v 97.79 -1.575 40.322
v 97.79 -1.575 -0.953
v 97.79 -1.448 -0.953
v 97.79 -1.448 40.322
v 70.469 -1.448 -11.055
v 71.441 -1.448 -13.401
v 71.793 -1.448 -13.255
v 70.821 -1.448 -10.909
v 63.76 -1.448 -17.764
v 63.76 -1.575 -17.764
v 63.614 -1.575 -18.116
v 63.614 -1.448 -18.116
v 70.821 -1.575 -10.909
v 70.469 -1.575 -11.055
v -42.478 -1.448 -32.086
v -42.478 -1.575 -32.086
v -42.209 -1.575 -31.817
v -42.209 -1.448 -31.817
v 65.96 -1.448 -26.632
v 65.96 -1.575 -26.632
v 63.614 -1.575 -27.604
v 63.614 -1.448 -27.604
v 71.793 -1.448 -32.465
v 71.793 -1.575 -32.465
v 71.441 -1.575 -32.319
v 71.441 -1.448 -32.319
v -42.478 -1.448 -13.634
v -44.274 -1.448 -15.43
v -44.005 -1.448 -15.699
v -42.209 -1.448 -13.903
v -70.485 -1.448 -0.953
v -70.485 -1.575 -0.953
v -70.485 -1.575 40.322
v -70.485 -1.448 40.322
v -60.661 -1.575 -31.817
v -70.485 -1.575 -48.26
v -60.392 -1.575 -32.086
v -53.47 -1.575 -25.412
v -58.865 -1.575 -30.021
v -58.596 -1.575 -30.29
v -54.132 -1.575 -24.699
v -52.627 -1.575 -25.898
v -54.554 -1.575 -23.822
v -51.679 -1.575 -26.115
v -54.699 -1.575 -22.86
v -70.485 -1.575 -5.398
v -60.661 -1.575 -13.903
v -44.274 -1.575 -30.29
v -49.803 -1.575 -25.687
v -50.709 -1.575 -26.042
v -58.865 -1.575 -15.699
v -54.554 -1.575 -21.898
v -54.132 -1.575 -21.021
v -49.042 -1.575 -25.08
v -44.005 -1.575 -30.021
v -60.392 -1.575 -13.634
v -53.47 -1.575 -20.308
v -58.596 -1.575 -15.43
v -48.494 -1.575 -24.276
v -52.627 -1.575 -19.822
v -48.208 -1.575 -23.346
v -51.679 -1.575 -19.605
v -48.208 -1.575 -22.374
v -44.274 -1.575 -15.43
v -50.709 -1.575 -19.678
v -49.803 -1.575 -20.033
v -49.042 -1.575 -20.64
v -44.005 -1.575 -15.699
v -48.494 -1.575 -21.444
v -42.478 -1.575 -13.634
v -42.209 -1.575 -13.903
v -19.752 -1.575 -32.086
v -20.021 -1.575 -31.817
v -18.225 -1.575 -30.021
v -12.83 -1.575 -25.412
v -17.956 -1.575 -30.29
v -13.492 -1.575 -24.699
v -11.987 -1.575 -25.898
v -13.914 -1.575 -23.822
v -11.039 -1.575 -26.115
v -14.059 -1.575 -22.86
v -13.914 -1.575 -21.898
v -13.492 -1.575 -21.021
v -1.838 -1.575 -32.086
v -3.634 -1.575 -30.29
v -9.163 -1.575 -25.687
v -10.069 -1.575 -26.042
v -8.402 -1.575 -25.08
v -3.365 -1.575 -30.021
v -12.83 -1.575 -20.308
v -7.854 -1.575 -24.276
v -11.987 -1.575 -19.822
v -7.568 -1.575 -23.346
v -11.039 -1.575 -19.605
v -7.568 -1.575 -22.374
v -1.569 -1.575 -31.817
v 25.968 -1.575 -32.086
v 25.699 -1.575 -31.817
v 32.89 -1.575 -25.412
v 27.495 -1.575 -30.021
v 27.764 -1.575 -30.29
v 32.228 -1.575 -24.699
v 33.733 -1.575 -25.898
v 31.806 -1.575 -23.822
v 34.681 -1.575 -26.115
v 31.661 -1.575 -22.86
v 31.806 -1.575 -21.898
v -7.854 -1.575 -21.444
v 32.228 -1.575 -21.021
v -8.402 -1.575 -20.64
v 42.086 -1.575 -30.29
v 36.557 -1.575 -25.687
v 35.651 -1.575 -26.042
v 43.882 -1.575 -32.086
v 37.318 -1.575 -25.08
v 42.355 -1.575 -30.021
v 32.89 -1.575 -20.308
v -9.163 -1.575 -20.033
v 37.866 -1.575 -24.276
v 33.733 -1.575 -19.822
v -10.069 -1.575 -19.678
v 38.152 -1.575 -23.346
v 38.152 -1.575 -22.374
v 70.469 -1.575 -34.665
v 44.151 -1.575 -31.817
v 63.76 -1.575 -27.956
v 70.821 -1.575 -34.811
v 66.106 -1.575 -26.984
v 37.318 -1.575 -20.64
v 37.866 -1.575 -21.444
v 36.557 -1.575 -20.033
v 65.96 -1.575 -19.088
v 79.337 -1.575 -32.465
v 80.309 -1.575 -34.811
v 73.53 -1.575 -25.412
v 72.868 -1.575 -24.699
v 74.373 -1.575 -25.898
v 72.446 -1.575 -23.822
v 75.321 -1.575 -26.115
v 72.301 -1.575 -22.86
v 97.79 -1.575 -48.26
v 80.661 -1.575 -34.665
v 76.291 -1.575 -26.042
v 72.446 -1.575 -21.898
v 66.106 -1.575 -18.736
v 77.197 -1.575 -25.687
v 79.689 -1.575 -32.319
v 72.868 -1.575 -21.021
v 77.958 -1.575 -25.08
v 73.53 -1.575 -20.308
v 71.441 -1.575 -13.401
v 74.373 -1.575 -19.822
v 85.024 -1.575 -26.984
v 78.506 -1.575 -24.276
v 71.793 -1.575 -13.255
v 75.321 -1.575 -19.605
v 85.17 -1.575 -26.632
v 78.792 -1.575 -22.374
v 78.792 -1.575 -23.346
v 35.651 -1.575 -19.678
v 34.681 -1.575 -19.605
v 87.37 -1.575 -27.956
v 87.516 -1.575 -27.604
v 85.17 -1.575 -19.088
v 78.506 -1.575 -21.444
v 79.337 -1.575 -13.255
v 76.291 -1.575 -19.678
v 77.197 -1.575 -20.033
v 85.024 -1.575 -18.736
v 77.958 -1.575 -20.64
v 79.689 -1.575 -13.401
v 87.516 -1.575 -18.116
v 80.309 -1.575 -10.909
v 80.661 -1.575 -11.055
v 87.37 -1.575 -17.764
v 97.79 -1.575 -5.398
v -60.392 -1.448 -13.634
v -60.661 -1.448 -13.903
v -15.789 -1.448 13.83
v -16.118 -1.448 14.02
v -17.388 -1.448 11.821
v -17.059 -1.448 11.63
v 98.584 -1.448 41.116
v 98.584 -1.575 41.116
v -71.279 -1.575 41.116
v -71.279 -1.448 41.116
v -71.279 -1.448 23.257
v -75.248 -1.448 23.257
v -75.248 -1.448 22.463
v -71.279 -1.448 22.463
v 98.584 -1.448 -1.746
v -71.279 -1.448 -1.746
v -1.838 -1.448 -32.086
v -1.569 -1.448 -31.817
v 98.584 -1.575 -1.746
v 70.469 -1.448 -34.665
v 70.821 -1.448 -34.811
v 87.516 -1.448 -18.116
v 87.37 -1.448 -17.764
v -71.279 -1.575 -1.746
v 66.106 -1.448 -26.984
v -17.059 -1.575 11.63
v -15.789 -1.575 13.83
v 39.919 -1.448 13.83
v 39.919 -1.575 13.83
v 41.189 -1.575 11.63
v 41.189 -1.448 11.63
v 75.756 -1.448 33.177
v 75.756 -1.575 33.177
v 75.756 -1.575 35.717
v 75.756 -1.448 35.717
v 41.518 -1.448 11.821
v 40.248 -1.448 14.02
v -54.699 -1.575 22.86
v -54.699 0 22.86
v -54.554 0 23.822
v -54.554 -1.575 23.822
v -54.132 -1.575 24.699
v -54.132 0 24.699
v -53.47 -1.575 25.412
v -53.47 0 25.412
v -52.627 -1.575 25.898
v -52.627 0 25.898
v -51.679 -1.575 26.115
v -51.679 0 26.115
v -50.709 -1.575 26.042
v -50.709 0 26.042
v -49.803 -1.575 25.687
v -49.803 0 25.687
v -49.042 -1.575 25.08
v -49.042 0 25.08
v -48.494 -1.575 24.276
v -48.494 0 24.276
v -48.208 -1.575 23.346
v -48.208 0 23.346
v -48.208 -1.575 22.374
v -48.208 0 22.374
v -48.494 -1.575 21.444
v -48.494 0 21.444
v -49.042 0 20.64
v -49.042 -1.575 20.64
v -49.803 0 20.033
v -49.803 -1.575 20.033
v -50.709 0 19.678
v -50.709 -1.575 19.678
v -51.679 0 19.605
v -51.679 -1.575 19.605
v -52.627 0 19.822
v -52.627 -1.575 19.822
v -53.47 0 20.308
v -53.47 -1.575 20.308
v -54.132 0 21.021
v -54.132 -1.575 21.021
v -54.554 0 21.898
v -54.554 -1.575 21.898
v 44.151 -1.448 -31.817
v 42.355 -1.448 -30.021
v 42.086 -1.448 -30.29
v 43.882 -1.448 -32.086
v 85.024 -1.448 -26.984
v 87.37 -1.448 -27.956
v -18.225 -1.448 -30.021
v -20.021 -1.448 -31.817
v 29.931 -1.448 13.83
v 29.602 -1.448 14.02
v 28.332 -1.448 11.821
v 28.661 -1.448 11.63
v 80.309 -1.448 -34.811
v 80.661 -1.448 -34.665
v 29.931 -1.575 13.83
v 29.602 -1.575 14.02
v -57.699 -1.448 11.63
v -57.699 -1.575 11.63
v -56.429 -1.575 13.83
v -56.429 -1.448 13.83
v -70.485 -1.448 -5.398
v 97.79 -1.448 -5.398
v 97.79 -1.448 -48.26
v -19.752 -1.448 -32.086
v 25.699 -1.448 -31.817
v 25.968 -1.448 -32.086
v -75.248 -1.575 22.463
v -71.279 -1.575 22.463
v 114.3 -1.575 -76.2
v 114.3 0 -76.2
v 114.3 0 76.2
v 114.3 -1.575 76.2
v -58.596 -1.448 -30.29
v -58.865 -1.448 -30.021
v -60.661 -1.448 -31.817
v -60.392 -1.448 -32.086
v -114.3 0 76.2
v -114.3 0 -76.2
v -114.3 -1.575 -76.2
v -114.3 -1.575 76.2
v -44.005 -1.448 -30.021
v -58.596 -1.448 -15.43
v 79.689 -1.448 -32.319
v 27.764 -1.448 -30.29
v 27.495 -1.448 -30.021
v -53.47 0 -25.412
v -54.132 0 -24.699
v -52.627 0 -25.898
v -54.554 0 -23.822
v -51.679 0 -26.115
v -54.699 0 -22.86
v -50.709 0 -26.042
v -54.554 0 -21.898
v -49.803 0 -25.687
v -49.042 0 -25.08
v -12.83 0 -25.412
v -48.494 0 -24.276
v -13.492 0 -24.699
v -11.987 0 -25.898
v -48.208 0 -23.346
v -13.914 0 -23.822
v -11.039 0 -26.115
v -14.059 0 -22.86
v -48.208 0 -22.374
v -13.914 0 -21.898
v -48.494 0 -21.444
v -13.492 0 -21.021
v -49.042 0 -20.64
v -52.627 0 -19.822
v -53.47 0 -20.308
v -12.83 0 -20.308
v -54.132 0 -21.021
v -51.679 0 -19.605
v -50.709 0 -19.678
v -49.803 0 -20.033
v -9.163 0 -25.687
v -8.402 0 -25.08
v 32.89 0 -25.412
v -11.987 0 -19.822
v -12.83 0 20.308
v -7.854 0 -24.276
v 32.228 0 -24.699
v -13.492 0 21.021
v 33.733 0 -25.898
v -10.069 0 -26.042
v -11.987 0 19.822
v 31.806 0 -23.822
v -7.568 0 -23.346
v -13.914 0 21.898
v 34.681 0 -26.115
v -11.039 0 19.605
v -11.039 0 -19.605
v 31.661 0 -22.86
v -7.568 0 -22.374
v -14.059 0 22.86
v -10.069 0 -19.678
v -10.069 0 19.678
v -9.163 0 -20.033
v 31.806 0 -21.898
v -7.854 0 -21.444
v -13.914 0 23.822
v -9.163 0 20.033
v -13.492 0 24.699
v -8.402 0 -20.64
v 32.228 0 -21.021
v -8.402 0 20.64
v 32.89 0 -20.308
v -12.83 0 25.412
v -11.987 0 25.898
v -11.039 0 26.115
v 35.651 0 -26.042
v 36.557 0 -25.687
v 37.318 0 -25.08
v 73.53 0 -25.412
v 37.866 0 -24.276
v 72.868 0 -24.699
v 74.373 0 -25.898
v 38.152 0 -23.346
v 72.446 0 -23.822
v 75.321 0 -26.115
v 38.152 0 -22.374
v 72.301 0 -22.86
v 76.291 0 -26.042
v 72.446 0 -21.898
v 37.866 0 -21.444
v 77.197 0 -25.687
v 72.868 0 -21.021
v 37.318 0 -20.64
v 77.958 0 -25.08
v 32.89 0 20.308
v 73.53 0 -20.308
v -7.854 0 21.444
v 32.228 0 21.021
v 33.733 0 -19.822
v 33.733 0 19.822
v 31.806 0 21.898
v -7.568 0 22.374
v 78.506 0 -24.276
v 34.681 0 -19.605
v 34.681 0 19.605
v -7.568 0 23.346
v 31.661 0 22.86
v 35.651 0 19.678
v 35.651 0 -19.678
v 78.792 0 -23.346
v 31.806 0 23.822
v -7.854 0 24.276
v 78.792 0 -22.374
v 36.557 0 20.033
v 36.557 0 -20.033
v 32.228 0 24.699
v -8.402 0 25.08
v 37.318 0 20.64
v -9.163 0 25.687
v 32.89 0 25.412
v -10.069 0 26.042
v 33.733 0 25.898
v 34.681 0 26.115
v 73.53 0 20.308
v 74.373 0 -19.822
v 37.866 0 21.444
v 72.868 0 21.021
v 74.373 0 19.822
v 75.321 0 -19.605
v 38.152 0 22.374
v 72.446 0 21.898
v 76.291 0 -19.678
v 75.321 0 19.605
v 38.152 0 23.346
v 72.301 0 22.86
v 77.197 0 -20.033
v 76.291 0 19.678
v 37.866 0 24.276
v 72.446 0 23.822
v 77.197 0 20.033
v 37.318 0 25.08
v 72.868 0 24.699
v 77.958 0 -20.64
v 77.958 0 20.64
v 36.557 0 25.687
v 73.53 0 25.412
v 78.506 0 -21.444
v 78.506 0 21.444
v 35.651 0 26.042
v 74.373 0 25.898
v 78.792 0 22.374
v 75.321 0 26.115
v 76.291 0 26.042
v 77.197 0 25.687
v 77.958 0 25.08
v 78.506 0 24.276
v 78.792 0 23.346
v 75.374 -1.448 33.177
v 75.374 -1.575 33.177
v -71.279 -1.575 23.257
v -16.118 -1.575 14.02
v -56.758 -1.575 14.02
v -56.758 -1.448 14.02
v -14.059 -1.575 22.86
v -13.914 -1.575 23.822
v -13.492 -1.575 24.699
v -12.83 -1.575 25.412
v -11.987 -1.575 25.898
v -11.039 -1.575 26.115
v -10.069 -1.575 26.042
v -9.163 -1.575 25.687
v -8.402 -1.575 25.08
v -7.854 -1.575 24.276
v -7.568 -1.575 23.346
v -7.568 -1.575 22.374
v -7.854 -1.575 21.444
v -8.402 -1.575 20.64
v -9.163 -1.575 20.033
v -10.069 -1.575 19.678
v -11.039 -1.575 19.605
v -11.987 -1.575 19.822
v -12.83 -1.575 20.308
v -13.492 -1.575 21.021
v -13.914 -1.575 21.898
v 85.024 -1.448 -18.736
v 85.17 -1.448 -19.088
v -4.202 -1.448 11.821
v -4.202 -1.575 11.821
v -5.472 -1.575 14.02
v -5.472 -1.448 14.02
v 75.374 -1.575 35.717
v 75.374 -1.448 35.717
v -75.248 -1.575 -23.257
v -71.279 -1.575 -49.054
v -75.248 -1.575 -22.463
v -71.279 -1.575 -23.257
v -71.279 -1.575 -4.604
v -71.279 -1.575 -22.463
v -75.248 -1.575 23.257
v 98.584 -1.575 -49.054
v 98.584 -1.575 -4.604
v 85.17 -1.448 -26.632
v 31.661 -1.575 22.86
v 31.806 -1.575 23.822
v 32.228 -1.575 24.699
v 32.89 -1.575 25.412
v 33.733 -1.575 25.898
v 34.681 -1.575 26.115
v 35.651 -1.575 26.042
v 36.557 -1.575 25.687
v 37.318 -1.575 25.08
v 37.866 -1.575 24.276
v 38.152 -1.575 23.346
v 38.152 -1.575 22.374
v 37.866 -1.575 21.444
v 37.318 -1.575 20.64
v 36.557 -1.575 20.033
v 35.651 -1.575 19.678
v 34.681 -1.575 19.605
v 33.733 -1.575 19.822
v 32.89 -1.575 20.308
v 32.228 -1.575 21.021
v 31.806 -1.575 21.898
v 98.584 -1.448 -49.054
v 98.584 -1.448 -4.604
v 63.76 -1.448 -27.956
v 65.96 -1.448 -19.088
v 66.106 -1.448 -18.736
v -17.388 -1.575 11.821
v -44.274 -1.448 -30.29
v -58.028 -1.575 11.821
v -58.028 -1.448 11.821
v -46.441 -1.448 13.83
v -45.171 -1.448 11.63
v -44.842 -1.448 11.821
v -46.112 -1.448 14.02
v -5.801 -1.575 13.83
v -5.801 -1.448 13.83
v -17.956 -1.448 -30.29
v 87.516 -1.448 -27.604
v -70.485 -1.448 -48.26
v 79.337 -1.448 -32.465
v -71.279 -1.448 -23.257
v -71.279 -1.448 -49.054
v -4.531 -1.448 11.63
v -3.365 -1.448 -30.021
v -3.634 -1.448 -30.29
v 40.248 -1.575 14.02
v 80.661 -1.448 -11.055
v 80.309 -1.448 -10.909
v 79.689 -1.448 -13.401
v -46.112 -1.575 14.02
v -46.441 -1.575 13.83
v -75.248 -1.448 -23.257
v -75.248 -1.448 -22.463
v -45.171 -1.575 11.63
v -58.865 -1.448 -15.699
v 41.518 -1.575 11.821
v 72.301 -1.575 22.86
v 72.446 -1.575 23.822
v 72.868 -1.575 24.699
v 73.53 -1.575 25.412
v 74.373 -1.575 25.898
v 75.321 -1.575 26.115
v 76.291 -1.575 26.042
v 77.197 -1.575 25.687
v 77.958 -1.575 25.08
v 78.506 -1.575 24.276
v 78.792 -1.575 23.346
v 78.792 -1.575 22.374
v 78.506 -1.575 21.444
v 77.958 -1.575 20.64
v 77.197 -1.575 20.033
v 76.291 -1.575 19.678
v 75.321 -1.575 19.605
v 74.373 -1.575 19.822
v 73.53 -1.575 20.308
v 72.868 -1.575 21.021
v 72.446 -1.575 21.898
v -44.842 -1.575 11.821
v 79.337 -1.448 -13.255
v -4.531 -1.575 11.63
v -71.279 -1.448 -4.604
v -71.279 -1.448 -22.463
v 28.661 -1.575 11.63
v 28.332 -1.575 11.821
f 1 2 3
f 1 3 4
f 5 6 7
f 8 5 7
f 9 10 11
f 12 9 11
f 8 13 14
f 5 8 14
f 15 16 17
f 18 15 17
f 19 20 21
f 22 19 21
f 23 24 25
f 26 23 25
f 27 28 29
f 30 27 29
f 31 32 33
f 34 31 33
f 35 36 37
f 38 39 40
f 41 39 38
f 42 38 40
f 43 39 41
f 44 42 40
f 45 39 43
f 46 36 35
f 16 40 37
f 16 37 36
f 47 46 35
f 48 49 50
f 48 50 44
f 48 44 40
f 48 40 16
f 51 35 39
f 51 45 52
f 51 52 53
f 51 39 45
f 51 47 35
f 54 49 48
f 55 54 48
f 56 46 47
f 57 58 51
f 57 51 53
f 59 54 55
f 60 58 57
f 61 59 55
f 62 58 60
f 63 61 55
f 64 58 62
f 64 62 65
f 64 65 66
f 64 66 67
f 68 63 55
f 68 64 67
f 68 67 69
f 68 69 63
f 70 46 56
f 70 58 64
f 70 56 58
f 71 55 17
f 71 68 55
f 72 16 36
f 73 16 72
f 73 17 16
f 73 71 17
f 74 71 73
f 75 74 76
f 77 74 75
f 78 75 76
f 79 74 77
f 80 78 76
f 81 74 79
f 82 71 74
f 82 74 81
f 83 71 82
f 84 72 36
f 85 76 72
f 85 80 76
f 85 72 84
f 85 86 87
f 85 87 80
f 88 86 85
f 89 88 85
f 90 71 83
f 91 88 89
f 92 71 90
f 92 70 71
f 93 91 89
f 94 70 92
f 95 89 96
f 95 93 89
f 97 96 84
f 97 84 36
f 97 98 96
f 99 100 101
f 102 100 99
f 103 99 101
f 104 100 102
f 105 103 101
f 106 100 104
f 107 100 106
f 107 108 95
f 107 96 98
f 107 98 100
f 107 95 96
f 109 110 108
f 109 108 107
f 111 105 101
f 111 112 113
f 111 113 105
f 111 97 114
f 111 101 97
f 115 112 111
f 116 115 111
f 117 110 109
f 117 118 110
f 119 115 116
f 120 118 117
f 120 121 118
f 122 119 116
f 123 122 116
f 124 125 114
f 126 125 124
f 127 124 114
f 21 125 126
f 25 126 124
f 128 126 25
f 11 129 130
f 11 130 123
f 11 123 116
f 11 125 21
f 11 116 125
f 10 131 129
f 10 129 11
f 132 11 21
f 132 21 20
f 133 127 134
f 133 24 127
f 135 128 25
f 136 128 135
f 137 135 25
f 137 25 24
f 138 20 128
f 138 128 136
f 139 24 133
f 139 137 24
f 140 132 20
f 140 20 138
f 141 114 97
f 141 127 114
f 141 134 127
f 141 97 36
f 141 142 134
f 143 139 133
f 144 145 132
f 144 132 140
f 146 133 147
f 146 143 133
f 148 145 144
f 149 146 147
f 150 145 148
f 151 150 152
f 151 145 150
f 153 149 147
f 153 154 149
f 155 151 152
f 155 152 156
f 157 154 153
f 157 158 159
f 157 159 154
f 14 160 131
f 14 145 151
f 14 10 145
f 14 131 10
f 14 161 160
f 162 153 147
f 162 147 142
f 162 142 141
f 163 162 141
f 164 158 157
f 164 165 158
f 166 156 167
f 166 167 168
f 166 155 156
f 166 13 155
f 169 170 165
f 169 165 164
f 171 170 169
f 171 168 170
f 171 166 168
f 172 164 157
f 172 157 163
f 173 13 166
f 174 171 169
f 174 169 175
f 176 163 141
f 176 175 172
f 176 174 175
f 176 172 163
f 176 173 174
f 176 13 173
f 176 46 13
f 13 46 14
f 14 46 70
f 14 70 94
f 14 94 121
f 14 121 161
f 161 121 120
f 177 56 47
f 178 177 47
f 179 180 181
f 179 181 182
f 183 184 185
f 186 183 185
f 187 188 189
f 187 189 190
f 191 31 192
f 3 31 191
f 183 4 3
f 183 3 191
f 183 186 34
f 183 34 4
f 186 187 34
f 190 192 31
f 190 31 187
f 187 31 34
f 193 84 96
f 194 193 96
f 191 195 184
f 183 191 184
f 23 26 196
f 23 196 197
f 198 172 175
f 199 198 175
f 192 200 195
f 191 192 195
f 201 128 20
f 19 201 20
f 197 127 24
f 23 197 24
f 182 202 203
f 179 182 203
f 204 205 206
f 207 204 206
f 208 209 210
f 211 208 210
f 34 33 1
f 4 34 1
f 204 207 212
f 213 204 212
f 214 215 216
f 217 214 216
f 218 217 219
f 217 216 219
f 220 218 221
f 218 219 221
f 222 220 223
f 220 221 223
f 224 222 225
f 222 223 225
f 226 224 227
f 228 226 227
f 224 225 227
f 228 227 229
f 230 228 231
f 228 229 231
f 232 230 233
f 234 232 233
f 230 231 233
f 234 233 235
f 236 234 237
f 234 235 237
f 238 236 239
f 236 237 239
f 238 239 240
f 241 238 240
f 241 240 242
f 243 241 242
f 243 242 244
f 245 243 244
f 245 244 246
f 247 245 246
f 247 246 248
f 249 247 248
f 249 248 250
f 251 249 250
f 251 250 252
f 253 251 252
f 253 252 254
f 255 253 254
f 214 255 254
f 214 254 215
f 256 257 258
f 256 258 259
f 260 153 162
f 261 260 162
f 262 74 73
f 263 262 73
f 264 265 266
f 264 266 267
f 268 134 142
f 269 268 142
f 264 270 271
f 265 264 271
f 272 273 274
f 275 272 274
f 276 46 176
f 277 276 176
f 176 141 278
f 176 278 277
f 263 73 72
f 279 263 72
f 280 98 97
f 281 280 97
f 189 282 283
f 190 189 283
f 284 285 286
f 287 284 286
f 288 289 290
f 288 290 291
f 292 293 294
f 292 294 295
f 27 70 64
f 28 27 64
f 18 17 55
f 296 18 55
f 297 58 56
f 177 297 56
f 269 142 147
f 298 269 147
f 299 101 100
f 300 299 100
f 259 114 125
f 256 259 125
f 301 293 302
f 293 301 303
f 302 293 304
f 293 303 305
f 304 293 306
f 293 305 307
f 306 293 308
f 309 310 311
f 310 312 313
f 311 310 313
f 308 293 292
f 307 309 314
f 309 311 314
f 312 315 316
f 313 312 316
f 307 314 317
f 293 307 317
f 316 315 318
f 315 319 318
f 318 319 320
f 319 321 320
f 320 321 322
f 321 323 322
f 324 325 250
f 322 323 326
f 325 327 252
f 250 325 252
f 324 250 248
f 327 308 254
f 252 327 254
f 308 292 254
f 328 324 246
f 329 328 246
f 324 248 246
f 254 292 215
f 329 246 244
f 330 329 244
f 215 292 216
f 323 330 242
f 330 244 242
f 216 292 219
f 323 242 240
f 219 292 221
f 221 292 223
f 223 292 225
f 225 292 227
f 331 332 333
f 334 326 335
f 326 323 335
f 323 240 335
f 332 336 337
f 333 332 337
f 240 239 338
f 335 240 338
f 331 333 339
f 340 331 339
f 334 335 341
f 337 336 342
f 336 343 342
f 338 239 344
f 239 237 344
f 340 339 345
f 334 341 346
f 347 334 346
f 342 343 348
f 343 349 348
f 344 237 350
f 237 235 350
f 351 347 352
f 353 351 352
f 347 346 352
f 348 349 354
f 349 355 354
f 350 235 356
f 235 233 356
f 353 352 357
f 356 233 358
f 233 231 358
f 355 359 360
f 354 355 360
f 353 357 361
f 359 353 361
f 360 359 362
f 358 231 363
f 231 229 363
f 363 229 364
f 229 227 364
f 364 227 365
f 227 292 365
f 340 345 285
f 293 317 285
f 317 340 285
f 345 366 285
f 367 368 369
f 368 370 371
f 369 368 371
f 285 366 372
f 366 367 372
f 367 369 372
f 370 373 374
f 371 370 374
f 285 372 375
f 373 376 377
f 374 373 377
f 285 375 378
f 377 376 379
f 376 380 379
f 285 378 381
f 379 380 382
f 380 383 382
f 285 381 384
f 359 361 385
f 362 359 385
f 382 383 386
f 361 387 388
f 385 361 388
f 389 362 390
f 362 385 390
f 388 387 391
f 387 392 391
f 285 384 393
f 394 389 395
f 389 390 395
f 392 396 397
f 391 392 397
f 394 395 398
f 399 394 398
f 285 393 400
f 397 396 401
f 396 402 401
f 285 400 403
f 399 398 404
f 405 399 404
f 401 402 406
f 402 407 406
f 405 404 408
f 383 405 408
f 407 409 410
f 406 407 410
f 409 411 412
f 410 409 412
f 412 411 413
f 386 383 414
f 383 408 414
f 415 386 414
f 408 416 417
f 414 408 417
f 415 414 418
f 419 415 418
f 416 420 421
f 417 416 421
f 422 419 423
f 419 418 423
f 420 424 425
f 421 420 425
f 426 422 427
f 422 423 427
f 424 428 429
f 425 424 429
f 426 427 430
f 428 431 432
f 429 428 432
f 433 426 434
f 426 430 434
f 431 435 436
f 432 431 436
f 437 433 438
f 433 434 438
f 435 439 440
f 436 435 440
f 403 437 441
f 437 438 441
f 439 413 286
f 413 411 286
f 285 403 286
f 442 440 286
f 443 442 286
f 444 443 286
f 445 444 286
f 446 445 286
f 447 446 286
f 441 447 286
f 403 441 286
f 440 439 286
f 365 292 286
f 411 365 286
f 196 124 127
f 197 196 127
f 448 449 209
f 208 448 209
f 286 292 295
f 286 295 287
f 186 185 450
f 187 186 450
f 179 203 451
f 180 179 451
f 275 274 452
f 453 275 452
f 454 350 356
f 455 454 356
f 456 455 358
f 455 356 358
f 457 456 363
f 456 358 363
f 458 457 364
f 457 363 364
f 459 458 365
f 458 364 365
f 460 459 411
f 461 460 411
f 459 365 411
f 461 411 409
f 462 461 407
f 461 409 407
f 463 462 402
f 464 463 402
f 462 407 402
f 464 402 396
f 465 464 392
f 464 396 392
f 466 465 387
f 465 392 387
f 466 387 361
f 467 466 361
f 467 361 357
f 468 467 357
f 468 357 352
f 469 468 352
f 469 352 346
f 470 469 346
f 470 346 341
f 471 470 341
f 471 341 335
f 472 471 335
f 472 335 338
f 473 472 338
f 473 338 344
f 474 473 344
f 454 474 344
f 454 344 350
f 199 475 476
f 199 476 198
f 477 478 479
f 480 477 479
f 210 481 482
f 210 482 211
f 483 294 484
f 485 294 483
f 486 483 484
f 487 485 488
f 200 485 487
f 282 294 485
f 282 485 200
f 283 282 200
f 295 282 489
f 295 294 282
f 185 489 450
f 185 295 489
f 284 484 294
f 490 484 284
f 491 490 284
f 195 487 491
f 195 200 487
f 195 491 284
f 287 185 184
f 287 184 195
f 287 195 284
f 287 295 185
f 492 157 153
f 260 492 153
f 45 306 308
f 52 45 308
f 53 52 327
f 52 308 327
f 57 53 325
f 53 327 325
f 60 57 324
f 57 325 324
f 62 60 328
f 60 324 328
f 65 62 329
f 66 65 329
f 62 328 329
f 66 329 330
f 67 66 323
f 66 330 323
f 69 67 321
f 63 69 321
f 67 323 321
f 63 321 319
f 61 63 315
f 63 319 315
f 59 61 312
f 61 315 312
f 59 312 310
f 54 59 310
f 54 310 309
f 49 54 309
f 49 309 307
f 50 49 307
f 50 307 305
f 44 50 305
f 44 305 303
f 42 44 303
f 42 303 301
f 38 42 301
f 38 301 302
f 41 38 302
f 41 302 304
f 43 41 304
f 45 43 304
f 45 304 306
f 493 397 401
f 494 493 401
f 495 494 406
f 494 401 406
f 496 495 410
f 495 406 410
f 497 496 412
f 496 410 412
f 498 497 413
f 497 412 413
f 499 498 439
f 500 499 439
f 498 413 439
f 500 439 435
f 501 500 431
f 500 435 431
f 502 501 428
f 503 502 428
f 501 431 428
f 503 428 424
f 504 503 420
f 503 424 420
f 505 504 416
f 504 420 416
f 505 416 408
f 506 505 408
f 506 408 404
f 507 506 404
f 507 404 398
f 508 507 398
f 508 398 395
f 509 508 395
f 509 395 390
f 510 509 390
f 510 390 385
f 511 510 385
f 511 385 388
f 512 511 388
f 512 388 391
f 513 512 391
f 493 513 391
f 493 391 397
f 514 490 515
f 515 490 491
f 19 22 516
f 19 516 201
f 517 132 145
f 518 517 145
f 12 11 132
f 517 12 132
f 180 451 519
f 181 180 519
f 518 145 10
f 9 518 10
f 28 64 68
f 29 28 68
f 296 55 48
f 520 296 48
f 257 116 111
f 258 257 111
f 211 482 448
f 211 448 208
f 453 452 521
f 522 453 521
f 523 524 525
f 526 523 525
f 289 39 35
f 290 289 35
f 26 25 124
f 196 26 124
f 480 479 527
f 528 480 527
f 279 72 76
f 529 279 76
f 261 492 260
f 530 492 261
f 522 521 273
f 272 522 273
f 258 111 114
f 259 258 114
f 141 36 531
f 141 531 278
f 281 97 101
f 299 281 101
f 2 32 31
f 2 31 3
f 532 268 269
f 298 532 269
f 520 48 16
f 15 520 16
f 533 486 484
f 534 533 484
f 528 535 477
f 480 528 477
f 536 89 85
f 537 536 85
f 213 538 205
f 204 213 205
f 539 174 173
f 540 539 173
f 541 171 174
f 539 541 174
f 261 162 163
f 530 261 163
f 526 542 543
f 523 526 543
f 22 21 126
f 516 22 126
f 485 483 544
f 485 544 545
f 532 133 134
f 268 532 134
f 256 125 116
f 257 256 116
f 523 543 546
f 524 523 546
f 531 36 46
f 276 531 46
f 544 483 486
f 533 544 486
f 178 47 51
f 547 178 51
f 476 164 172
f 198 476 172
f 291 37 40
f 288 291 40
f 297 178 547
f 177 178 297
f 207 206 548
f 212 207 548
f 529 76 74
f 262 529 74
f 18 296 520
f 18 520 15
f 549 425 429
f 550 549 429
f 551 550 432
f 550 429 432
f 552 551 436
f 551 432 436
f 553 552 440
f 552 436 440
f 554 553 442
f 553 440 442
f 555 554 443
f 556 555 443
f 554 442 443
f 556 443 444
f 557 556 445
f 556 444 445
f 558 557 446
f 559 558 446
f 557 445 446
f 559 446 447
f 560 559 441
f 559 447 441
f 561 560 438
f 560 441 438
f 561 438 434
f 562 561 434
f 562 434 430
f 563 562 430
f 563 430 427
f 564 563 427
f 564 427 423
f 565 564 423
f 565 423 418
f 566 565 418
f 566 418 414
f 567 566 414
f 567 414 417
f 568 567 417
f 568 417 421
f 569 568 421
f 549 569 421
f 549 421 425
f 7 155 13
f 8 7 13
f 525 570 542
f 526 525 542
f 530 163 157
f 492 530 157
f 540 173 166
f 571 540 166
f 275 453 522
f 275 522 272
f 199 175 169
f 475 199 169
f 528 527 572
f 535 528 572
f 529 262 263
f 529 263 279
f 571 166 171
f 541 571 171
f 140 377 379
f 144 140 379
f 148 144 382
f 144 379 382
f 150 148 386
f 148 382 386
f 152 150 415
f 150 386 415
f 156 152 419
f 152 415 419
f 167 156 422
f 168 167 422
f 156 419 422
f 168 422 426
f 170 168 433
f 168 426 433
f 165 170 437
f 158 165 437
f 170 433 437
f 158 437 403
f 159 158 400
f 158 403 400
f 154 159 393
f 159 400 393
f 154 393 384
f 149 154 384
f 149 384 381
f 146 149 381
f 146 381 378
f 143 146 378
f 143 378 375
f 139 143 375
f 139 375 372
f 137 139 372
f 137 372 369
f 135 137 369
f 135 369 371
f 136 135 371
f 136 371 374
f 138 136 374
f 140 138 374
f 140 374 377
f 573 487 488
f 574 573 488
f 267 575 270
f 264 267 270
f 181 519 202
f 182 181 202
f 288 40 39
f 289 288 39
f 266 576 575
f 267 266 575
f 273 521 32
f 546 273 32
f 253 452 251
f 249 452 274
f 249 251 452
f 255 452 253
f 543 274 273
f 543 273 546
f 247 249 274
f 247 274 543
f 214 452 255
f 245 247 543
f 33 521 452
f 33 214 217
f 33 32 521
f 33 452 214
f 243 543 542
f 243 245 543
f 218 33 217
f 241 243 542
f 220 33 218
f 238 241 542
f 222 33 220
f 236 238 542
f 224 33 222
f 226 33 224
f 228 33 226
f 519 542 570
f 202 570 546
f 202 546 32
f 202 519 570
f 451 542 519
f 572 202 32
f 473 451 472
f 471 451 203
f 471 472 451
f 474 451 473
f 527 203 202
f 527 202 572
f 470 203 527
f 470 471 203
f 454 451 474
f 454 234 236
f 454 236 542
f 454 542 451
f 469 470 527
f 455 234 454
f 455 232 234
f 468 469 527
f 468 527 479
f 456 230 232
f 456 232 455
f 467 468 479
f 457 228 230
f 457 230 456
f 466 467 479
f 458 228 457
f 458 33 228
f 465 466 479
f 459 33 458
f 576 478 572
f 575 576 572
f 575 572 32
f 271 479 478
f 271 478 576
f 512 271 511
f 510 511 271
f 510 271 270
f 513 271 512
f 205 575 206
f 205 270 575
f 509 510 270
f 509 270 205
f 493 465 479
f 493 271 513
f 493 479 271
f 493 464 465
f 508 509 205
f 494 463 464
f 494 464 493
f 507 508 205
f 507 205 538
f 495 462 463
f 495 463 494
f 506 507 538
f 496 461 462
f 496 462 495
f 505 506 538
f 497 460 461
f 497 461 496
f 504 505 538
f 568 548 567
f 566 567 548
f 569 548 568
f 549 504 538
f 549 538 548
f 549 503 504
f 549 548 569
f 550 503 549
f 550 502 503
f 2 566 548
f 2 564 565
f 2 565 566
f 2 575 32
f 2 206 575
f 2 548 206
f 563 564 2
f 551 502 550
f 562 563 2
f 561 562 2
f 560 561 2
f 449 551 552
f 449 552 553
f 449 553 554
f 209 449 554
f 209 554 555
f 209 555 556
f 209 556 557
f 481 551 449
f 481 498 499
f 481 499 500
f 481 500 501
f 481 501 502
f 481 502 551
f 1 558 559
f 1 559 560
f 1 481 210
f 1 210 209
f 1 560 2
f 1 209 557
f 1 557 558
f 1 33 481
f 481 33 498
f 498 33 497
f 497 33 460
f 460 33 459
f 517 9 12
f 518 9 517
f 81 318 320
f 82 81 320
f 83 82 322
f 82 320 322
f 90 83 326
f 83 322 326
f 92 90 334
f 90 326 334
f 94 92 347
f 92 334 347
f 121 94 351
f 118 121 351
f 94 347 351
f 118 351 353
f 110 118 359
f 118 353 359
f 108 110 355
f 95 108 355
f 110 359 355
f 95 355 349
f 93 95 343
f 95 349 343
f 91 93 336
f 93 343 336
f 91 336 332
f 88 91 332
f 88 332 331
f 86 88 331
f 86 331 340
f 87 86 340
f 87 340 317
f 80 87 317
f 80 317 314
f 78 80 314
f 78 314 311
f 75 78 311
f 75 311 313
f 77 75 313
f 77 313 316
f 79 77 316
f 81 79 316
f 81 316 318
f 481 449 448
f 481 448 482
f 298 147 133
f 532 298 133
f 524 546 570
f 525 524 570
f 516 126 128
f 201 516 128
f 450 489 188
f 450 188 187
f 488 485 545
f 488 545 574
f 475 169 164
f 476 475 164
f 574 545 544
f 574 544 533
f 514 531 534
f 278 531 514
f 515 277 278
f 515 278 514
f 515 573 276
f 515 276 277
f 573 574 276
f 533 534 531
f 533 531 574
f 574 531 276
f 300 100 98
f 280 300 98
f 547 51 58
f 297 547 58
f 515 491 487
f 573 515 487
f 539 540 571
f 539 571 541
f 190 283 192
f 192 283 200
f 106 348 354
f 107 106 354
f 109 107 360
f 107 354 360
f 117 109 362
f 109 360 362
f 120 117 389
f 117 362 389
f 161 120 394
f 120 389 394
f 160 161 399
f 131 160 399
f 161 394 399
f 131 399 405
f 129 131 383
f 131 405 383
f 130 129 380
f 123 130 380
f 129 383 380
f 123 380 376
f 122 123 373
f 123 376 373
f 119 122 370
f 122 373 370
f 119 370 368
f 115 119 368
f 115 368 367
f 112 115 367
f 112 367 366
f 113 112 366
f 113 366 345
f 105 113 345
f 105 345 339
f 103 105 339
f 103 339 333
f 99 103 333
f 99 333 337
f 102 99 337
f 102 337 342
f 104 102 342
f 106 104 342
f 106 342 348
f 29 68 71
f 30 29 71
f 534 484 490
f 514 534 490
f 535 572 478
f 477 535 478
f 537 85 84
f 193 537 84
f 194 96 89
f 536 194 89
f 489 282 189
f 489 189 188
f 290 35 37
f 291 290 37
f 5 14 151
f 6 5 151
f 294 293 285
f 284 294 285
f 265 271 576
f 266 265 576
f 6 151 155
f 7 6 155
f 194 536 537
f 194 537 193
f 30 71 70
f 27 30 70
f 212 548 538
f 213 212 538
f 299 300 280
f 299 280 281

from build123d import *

# Parameters (mm, degrees)
F0_W     = 228.6
F0_H     = 152.4
F1_DEPTH = 1.5748
F3_D     = 6.5278
F5_W     = 0.381
F5_H     = 2.54
F6_DEPTH = 0.127
F7_W     = 168.275
F7_H     = 41.275
F7_W_2   = 3.96875
F7_H_2   = 0.79375
F7_H_3   = 42.8625
F8_DEPTH = 0.127


with BuildPart() as f1:
    # F0 (on Front) → F1 (new body)
    with BuildSketch(Plane.XZ):
        Rectangle(F0_W, F0_H)
    extrude(amount=F1_DEPTH)

    # F3 (through all)
    with Locations(Plane.XZ.offset(1.5748)):
        with Locations((-51.435, 22.86), (-10.795, 22.86), (34.925, 22.86), (75.565, 22.86), (75.565, -22.86), (34.925, -22.86), (-10.795, -22.86), (-51.435, -22.86)):
            Hole(F3_D / 2)

    # F5 (on face) → F6 (cut)
    with BuildSketch(Plane.XZ.offset(1.5748)):
        Polygon((-42.2090303616, -31.8165619547), (-44.0050815859, -30.0205107305), (-44.2744892695, -30.2899184141), (-42.4784380453, -32.0859696384), align=None)
        Polygon((-42.2090303616, -13.9034380453), (-42.4784380453, -13.6340303616), (-44.2744892695, -15.4300815859), (-44.0050815859, -15.6994892695), align=None)
        Polygon((80.3091585435, -10.9087876125), (79.3371426253, -13.2554416251), (79.6891407272, -13.4012440128), (80.6611566454, -11.0545900003), align=None)
        Polygon((85.0237559872, -18.7358592728), (85.1695583749, -19.0878573747), (87.5162123875, -18.1158414565), (87.3704099997, -17.7638433546), align=None)
        Polygon((85.1695583749, -26.6321426253), (85.0237559872, -26.9841407272), (87.3704099997, -27.9561566454), (87.5162123875, -27.6041585435), align=None)
        Polygon((79.6891407272, -32.3187559872), (79.3371426253, -32.4645583749), (80.3091585435, -34.8112123875), (80.6611566454, -34.6654099997), align=None)
        Polygon((71.7928573747, -32.4645583749), (71.4408592728, -32.3187559872), (70.4688433546, -34.6654099997), (70.8208414565, -34.8112123875), align=None)
        Polygon((66.1062440128, -26.9841407272), (65.9604416251, -26.6321426253), (63.6137876125, -27.6041585435), (63.7595900003, -27.9561566454), align=None)
        Polygon((65.9604416251, -19.0878573747), (66.1062440128, -18.7358592728), (63.7595900003, -17.7638433546), (63.6137876125, -18.1158414565), align=None)
        Polygon((71.4408592728, -13.4012440128), (71.7928573747, -13.2554416251), (70.8208414565, -10.9087876125), (70.4688433546, -11.0545900003), align=None)
        Polygon((27.4950815859, -30.0205107305), (25.6990303616, -31.8165619547), (25.9684380453, -32.0859696384), (27.7644892695, -30.2899184141), align=None)
        Polygon((44.1509696384, -31.8165619547), (42.3549184141, -30.0205107305), (42.0855107305, -30.2899184141), (43.8815619547, -32.0859696384), align=None)
        Polygon((-18.2249184141, -30.0205107305), (-20.0209696384, -31.8165619547), (-19.7515619547, -32.0859696384), (-17.9555107305, -30.2899184141), align=None)
        Polygon((-1.5690303616, -31.8165619547), (-3.3650815859, -30.0205107305), (-3.6344892695, -30.2899184141), (-1.8384380453, -32.0859696384), align=None)
        Polygon((-58.8649184141, -30.0205107305), (-60.6609696384, -31.8165619547), (-60.3915619547, -32.0859696384), (-58.5955107305, -30.2899184141), align=None)
        Polygon((-16.1184735337, 14.0204733668), (-17.3884735337, 11.8207688412), (-17.0585178549, 11.6302688412), (-15.7885178549, 13.8299733668), align=None)
        Polygon((-4.2015264663, 11.8207688412), (-5.4715264663, 14.0204733668), (-5.8014821451, 13.8299733668), (-4.5314821451, 11.6302688412), align=None)
        Polygon((-56.7584735337, 14.0204733668), (-58.0284735337, 11.8207688412), (-57.6985178549, 11.6302688412), (-56.4285178549, 13.8299733668), align=None)
        Polygon((-44.8415264663, 11.8207688412), (-46.1115264663, 14.0204733668), (-46.4414821451, 13.8299733668), (-45.1714821451, 11.6302688412), align=None)
        with Locations((75.565, 34.4469913886)):
            Rectangle(F5_W, F5_H)
        Polygon((40.2484735337, 14.0204733668), (40.0834956943, 13.9252233668), (41.3534956943, 11.7255188412), (41.5184735337, 11.8207688412), align=None)
        Polygon((41.3534956943, 11.7255188412), (40.0834956943, 13.9252233668), (39.9185178549, 13.8299733668), (41.1885178549, 11.6302688412), align=None)
        Polygon((29.6015264663, 14.0204733668), (28.3315264663, 11.8207688412), (28.6614821451, 11.6302688412), (29.9314821451, 13.8299733668), align=None)
        Polygon((-58.5955107305, -15.4300815859), (-60.3915619547, -13.6340303616), (-60.6609696384, -13.9034380453), (-58.8649184141, -15.6994892695), align=None)
    extrude(amount=-F6_DEPTH, mode=Mode.SUBTRACT)

    # F7 (on face) → F8 (cut)
    with BuildSketch(Plane.XZ.offset(1.5748)):
        Polygon((98.58375, 41.11625), (-71.27875, 41.11625), (-71.27875, 23.256875), (-71.27875, 22.463125), (-71.27875, -1.74625), (98.58375, -1.74625), align=None)
        with Locations((13.6525, 19.685)):
            Rectangle(F7_W, F7_H, mode=Mode.SUBTRACT)
        with Locations((-73.263125, 22.86)):
            Rectangle(F7_W_2, F7_H_2)
        Polygon((98.58375, -4.60375), (-71.27875, -4.60375), (-71.27875, -22.463125), (-71.27875, -23.256875), (-71.27875, -49.05375), (98.58375, -49.05375), align=None)
        with Locations((13.6525, -26.82875)):
            Rectangle(F7_W, F7_H_3, mode=Mode.SUBTRACT)
        with Locations((-73.263125, -22.86)):
            Rectangle(F7_W_2, F7_H_2)
    extrude(amount=-F8_DEPTH, mode=Mode.SUBTRACT)


solid = f1.part
